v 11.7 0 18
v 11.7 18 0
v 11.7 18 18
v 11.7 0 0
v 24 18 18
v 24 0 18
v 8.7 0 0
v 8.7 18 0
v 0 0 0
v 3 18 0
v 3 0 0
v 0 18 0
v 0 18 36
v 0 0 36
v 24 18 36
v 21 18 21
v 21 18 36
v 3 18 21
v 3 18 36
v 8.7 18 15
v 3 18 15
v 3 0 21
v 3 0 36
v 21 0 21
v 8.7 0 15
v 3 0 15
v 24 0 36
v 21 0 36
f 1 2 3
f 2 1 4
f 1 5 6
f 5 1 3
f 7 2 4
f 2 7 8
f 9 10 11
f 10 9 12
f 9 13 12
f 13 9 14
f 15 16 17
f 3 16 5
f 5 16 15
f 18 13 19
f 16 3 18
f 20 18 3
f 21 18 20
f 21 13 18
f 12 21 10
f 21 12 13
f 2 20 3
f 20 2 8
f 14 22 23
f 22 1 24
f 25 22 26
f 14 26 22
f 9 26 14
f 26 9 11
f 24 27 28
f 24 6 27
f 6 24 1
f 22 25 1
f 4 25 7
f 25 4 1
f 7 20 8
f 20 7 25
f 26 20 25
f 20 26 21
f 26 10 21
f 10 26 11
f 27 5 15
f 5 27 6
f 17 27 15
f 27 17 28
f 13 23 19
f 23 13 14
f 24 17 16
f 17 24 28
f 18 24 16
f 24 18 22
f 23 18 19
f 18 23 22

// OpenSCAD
union () {
  difference () {
    cube ([11.7, 18, 18]);
    translate ([3, -0.5, -1]) {
      cube ([5.7, 19, 16]);
    }
  }
  translate ([0, 0, 36]) {
    mirror ([0, 0, 1]) {
      difference () {
        cube ([24, 18, 18]);
        translate ([3, -0.5, -1]) {
          cube ([18, 19, 16]);
        }
      }
    }
  }
}
